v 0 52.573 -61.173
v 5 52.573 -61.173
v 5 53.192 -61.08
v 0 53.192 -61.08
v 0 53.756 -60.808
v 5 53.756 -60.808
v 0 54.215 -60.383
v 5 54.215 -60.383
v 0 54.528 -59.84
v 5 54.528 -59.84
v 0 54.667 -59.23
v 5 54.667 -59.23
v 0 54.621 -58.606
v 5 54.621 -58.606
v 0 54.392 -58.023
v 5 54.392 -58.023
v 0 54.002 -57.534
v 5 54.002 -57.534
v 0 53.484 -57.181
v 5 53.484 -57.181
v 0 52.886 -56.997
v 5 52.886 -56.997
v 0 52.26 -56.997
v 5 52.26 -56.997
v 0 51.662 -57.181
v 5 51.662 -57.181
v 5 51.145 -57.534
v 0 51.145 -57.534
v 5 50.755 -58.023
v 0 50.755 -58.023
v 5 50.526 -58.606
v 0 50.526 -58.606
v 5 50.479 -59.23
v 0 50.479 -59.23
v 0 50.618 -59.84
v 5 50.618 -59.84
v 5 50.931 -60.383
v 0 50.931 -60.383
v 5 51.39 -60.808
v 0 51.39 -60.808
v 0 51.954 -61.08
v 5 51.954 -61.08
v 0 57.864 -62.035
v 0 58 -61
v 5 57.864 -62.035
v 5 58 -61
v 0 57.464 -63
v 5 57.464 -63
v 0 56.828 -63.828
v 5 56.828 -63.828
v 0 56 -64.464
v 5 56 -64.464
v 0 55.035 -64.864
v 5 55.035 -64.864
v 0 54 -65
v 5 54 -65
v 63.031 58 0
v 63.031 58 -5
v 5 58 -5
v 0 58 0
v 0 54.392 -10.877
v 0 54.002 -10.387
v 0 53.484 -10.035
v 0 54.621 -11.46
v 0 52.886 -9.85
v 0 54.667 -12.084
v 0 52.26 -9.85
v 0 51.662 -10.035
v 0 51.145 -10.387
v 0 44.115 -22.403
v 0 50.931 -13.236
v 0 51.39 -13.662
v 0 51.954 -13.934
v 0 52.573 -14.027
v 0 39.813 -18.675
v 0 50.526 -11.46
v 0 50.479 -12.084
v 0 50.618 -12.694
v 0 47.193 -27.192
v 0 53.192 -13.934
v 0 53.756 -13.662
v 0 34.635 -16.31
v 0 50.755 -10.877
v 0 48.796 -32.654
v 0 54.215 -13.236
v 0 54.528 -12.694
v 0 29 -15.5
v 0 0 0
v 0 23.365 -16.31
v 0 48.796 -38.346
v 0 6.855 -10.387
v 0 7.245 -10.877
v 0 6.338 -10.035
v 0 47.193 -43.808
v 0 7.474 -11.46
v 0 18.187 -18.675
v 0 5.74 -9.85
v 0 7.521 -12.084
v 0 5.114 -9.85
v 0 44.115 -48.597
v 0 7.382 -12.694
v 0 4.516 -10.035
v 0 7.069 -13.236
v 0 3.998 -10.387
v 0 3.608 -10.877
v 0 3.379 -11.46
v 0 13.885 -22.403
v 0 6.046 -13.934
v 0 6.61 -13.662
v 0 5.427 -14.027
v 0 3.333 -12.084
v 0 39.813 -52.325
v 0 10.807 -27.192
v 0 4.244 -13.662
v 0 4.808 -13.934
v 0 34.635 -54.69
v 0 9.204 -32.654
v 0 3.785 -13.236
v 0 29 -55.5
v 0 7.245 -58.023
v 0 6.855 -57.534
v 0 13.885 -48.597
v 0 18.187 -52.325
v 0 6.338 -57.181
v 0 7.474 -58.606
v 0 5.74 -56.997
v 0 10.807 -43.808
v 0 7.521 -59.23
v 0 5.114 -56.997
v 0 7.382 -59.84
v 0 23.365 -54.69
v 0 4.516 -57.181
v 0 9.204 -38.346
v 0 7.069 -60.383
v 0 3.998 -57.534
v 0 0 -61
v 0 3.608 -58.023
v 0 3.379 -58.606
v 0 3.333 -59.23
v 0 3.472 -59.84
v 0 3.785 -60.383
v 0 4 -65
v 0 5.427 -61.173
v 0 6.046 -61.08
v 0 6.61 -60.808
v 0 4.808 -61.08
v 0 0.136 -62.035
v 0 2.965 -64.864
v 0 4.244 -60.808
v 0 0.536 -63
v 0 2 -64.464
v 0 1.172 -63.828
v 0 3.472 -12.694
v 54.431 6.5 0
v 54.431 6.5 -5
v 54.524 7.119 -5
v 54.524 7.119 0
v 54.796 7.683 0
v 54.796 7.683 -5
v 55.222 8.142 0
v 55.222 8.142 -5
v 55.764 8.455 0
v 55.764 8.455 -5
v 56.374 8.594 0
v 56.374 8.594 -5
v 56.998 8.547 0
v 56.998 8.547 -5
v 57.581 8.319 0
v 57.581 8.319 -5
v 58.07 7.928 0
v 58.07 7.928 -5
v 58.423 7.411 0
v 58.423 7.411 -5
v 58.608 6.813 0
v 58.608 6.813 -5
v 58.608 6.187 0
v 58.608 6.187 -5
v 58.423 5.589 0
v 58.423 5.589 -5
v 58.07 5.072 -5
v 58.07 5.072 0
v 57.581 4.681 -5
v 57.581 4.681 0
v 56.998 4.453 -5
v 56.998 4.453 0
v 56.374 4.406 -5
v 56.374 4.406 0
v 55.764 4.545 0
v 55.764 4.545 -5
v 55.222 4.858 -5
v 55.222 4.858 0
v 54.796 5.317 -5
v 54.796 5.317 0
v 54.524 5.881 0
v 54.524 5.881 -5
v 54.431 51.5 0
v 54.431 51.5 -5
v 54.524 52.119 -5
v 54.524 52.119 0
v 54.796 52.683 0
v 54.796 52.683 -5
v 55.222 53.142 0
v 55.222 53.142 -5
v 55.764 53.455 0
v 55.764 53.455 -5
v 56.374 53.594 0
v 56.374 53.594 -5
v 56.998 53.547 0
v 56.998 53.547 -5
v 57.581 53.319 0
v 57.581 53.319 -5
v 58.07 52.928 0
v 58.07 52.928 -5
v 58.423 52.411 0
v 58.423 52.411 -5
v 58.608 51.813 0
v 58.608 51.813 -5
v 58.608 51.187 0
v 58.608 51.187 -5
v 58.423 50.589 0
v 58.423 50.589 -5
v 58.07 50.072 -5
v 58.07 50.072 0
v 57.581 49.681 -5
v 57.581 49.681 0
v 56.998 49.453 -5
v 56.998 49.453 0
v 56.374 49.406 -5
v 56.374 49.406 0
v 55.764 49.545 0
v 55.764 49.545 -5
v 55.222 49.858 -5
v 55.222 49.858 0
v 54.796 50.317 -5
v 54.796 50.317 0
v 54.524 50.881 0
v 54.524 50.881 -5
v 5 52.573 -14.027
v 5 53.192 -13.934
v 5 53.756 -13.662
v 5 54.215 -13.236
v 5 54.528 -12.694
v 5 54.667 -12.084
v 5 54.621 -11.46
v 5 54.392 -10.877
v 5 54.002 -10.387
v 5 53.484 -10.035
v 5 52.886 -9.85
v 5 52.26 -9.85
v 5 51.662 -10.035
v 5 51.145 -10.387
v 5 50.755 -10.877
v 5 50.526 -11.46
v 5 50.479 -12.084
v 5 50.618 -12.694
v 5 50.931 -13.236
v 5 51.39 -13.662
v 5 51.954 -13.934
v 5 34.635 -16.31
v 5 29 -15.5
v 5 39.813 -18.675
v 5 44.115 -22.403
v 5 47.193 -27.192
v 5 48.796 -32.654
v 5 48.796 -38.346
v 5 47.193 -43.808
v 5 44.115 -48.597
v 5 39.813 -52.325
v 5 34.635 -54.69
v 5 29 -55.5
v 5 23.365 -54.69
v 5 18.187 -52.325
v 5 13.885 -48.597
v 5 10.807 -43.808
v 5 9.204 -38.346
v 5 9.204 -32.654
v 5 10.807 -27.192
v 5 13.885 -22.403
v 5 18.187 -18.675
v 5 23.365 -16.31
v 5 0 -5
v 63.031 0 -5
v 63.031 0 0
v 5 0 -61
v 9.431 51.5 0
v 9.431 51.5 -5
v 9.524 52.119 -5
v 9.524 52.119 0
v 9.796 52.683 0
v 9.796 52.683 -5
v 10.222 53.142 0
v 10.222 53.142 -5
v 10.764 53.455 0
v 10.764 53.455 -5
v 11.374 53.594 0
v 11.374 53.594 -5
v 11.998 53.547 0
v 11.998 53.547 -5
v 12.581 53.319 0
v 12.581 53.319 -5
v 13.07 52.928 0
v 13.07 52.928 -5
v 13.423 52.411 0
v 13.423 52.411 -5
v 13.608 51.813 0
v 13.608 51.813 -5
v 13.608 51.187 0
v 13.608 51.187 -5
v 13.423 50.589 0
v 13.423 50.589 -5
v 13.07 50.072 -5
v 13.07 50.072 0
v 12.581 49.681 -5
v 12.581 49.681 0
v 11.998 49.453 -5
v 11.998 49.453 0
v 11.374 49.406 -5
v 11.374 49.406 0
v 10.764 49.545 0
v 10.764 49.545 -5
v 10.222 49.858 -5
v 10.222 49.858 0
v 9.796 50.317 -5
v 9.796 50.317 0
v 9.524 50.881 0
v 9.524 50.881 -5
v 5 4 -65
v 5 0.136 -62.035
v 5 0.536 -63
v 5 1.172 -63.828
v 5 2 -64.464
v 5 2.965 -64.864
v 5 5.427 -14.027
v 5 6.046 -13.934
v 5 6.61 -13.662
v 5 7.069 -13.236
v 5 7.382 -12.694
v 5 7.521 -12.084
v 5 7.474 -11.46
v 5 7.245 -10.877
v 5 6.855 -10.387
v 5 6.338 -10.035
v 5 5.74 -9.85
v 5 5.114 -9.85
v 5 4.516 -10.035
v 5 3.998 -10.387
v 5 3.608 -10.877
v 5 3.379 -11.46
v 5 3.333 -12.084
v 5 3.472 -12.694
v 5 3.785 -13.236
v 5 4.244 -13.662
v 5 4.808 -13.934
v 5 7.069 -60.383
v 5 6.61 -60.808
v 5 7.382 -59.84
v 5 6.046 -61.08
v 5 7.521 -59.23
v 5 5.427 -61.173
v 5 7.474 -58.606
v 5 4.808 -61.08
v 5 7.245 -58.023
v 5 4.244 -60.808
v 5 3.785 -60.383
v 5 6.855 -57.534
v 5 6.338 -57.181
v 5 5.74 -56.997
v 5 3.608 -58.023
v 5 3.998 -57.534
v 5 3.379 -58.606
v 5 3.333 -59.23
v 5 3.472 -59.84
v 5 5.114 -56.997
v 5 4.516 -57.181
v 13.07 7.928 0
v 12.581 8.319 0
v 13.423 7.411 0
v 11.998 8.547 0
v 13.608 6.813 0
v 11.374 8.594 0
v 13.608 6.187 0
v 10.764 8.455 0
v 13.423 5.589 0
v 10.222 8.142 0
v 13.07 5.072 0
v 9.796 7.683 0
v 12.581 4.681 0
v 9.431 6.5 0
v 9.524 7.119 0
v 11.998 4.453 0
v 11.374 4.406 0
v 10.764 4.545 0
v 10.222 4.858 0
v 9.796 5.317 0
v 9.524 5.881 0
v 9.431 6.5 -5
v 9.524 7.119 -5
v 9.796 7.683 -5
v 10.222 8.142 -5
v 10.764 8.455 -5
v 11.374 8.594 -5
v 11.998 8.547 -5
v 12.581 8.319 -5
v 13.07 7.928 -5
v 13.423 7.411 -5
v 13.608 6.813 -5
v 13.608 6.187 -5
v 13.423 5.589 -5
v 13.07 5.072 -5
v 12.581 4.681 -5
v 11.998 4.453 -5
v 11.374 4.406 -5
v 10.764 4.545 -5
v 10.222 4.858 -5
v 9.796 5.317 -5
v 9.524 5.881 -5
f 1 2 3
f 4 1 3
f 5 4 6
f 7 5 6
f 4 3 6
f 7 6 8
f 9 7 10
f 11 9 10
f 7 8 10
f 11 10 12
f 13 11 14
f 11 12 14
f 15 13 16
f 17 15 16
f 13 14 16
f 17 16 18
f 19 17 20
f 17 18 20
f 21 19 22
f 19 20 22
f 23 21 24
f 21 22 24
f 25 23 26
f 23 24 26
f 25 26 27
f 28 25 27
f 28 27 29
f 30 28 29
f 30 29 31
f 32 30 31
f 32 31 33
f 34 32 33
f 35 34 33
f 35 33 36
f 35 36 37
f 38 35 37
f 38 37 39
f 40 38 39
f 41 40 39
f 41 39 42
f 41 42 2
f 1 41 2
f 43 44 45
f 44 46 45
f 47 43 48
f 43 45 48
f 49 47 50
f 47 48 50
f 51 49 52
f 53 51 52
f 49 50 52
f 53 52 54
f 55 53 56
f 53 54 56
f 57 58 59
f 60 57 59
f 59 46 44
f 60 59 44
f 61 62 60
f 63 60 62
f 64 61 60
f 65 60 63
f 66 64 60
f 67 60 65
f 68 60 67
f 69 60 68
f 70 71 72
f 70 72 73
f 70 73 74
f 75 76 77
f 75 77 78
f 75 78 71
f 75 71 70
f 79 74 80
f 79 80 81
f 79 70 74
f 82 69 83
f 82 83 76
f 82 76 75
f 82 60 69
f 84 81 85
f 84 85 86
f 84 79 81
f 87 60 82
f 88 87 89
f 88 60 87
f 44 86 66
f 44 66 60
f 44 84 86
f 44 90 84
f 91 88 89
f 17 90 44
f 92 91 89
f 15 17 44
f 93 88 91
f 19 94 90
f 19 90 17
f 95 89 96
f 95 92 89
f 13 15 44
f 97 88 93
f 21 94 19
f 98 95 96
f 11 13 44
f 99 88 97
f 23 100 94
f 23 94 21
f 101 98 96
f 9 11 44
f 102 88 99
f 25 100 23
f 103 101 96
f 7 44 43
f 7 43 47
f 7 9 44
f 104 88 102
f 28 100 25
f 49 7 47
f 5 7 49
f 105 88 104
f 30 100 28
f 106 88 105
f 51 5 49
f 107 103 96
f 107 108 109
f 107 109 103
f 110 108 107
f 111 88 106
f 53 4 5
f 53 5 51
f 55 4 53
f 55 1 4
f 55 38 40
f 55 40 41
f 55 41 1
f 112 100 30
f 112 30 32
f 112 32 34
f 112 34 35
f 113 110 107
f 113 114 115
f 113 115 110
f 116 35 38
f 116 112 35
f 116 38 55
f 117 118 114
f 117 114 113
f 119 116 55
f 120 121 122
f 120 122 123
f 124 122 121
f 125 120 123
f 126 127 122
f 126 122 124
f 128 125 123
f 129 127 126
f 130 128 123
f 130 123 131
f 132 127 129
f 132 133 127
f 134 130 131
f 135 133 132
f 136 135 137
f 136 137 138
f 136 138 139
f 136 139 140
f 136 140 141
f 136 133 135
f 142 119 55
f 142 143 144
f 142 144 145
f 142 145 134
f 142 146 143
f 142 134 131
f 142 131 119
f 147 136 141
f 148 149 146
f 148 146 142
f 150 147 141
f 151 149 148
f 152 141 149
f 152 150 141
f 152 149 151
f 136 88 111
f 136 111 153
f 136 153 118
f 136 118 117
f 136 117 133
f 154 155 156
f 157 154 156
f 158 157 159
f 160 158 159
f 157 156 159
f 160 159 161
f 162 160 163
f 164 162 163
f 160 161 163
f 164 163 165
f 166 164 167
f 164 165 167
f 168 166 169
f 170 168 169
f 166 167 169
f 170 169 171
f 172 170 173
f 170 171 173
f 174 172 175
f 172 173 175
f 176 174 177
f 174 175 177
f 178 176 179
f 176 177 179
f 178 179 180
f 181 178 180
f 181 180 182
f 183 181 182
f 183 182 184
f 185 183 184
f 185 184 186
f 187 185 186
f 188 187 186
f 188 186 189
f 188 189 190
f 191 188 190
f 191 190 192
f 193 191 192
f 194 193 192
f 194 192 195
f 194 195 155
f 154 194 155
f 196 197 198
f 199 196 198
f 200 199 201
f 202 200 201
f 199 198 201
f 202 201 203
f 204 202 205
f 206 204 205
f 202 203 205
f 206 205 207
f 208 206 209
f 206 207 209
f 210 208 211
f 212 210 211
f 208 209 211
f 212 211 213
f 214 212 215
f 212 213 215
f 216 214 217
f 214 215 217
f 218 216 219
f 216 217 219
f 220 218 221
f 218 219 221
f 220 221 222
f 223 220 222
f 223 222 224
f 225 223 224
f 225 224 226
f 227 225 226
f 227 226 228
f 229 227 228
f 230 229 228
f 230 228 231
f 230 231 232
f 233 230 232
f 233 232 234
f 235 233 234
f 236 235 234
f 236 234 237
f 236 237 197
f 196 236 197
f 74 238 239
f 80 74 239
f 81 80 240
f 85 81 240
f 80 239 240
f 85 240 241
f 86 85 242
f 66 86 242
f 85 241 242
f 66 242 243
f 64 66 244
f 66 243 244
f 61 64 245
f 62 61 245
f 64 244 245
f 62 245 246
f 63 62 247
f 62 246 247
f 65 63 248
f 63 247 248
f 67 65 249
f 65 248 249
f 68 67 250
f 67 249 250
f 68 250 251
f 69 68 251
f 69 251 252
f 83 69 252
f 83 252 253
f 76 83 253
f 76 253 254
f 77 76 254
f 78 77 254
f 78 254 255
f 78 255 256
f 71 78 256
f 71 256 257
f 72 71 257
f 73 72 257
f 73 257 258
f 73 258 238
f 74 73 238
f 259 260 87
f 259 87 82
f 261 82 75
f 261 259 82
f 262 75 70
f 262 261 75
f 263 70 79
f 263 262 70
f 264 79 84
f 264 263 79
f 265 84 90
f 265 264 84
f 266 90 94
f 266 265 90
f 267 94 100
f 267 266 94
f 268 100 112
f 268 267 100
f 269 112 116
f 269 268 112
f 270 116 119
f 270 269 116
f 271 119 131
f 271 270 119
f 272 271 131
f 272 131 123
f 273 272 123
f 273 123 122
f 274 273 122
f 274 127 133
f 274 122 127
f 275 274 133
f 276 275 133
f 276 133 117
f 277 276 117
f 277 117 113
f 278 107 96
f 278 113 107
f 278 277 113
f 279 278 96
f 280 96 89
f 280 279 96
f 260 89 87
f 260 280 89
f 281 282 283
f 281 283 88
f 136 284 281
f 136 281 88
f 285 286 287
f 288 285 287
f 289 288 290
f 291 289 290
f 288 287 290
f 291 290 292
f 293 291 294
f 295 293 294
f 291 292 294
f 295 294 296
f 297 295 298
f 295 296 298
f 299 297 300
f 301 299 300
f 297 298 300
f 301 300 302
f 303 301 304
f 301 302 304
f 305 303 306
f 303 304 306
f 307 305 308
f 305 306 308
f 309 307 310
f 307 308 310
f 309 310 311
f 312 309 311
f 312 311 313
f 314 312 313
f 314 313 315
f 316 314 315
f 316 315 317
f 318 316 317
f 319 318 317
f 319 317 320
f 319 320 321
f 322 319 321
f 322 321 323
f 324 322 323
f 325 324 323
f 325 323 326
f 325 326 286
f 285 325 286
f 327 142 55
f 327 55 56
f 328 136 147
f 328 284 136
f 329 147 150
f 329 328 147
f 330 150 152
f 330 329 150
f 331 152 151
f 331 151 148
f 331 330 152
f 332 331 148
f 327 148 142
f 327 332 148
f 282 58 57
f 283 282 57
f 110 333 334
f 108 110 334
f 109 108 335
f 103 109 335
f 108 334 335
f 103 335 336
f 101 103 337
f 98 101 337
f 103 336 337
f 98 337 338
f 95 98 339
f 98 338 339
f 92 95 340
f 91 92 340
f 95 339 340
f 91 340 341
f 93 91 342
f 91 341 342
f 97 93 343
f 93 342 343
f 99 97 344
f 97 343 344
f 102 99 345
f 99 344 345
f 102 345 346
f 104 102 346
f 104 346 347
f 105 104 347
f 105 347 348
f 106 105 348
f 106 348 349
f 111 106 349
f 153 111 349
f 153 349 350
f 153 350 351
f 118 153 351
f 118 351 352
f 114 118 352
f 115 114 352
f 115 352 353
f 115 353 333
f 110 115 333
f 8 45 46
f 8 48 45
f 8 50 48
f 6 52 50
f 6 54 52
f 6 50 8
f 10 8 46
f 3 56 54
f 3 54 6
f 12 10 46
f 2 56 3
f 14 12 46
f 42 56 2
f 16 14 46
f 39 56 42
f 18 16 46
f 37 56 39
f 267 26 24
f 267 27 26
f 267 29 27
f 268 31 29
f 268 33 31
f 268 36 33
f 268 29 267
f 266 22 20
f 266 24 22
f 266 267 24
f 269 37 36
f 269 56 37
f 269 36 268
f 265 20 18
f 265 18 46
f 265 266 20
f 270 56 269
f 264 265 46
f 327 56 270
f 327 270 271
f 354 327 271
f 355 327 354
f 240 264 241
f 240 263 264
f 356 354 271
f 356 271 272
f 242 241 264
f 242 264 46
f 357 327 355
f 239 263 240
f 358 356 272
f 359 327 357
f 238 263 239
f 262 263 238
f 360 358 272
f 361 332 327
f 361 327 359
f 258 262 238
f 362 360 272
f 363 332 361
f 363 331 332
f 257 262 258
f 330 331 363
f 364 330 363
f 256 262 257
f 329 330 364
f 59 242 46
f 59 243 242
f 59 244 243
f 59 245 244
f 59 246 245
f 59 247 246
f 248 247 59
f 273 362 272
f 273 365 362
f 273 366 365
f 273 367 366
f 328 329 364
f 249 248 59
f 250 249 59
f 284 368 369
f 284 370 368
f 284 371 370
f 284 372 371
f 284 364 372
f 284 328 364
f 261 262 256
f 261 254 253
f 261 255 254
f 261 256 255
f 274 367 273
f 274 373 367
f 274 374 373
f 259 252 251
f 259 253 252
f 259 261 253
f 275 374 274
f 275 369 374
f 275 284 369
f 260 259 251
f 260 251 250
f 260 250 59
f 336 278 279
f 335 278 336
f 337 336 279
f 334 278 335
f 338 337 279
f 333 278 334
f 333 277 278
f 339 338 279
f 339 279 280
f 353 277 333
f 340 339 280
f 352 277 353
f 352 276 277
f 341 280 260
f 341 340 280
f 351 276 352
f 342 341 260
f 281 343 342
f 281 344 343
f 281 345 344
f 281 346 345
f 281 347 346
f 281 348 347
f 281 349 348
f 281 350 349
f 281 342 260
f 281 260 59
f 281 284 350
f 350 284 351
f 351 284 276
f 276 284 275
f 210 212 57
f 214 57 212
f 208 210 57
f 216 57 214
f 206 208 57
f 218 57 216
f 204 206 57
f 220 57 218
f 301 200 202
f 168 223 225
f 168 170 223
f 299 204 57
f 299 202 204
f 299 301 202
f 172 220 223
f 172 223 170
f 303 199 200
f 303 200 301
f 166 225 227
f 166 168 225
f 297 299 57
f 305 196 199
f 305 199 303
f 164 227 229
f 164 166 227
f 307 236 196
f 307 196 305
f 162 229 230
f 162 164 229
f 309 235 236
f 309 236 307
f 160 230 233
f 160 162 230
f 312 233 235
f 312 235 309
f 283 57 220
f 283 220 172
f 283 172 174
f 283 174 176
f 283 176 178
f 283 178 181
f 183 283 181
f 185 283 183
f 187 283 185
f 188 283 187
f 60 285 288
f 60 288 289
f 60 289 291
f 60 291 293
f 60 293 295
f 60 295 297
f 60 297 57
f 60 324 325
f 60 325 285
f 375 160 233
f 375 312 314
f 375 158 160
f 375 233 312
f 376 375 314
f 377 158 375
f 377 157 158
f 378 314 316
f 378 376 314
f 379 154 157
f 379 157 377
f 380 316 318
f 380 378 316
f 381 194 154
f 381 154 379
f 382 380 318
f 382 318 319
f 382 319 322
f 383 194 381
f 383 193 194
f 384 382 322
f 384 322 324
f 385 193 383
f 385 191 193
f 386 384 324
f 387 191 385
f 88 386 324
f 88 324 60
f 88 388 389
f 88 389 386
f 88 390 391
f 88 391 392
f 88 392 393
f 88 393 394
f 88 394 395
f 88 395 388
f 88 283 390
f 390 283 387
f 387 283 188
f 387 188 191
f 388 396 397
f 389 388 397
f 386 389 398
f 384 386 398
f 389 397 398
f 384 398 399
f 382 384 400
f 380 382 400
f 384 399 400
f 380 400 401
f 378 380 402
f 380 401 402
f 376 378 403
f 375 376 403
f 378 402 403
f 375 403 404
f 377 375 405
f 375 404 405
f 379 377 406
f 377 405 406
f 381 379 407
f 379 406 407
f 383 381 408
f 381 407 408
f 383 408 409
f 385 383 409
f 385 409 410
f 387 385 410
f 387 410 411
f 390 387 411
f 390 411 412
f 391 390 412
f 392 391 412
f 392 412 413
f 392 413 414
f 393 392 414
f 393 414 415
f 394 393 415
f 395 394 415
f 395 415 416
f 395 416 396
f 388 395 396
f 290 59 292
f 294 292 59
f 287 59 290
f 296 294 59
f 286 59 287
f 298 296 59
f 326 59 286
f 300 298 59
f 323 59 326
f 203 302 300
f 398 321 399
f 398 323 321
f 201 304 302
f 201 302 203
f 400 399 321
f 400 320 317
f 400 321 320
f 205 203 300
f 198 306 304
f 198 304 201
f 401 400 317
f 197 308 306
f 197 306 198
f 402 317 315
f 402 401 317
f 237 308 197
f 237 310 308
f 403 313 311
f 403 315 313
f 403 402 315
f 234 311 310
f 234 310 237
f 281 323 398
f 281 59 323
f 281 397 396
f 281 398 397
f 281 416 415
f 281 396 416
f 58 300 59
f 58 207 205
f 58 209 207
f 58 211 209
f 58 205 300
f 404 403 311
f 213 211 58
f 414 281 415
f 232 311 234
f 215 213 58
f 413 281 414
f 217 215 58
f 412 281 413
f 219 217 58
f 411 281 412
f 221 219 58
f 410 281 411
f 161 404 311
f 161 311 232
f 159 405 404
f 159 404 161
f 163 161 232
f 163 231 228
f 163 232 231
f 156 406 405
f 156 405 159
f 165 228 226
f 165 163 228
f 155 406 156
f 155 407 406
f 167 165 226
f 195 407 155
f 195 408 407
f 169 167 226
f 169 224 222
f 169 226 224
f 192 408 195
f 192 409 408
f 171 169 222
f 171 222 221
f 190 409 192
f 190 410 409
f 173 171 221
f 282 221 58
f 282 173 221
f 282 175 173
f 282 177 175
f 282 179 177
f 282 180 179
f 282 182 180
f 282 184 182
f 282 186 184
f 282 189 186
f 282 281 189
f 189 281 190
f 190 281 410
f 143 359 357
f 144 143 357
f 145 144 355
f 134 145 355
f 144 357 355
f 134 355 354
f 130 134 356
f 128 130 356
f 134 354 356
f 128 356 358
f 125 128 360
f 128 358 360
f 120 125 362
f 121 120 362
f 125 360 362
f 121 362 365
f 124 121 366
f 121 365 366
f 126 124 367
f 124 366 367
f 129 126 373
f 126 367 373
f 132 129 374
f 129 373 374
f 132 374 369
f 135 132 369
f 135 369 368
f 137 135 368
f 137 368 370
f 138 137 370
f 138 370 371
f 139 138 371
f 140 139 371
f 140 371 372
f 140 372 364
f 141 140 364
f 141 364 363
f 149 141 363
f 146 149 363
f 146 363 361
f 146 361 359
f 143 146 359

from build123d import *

# Parameters (mm, degrees)
BOSS_EXTRUDE2_DEPTH   = 58
SKETCH3_R             = 20
CUT_EXTRUDE3_DEPTH    = 105.673761331
M5X0_8_TAPPED_HOLE3_D = 4.2
M5X0_8_TAPPED_HOLE2_D = 4.2
FILLET1_R             = 4


with BuildPart() as part:
    # Sketch2 → Boss-Extrude2 (new body)
    with BuildSketch(Plane(origin=(0, 0, 0), x_dir=(1, 0, 0), z_dir=(0, 1, 0))):
        Polygon((0, 0), (0, 65), (5, 65), (5, 5), (63.030994401, 5), (63.030994401, 0), align=None)
    extrude(amount=BOSS_EXTRUDE2_DEPTH)

    # Sketch3 → Cut-Extrude3 (cut, through all)
    with BuildSketch(Plane.ZY.offset(-5)):
        with Locations((-35.5, 29)):
            Circle(SKETCH3_R)
    extrude(amount=CUT_EXTRUDE3_DEPTH, mode=Mode.SUBTRACT)

    # M5x0.8 Tapped Hole3 (through all)
    with Locations(Plane.XY):
        with Locations((11.530994401, 6.5), (11.530994401, 51.5), (56.530994401, 51.5), (56.530994401, 6.5)):
            Hole(M5X0_8_TAPPED_HOLE3_D / 2)

    # M5x0.8 Tapped Hole2 (through all)
    with Locations(Plane.ZY):
        with Locations((-11.926827682, 5.426827682), (-11.926827682, 52.573172318), (-59.073172318, 52.573172318), (-59.073172318, 5.426827682)):
            Hole(M5X0_8_TAPPED_HOLE2_D / 2)

    # Fillet1
    fillet1_edges = [part.edges().sort_by_distance(p)[0] for p in [
        (2.5, 58, -65),
        (2.5, 0, -65),
    ]]
    fillet(fillet1_edges, radius=FILLET1_R)


solid = part.part
